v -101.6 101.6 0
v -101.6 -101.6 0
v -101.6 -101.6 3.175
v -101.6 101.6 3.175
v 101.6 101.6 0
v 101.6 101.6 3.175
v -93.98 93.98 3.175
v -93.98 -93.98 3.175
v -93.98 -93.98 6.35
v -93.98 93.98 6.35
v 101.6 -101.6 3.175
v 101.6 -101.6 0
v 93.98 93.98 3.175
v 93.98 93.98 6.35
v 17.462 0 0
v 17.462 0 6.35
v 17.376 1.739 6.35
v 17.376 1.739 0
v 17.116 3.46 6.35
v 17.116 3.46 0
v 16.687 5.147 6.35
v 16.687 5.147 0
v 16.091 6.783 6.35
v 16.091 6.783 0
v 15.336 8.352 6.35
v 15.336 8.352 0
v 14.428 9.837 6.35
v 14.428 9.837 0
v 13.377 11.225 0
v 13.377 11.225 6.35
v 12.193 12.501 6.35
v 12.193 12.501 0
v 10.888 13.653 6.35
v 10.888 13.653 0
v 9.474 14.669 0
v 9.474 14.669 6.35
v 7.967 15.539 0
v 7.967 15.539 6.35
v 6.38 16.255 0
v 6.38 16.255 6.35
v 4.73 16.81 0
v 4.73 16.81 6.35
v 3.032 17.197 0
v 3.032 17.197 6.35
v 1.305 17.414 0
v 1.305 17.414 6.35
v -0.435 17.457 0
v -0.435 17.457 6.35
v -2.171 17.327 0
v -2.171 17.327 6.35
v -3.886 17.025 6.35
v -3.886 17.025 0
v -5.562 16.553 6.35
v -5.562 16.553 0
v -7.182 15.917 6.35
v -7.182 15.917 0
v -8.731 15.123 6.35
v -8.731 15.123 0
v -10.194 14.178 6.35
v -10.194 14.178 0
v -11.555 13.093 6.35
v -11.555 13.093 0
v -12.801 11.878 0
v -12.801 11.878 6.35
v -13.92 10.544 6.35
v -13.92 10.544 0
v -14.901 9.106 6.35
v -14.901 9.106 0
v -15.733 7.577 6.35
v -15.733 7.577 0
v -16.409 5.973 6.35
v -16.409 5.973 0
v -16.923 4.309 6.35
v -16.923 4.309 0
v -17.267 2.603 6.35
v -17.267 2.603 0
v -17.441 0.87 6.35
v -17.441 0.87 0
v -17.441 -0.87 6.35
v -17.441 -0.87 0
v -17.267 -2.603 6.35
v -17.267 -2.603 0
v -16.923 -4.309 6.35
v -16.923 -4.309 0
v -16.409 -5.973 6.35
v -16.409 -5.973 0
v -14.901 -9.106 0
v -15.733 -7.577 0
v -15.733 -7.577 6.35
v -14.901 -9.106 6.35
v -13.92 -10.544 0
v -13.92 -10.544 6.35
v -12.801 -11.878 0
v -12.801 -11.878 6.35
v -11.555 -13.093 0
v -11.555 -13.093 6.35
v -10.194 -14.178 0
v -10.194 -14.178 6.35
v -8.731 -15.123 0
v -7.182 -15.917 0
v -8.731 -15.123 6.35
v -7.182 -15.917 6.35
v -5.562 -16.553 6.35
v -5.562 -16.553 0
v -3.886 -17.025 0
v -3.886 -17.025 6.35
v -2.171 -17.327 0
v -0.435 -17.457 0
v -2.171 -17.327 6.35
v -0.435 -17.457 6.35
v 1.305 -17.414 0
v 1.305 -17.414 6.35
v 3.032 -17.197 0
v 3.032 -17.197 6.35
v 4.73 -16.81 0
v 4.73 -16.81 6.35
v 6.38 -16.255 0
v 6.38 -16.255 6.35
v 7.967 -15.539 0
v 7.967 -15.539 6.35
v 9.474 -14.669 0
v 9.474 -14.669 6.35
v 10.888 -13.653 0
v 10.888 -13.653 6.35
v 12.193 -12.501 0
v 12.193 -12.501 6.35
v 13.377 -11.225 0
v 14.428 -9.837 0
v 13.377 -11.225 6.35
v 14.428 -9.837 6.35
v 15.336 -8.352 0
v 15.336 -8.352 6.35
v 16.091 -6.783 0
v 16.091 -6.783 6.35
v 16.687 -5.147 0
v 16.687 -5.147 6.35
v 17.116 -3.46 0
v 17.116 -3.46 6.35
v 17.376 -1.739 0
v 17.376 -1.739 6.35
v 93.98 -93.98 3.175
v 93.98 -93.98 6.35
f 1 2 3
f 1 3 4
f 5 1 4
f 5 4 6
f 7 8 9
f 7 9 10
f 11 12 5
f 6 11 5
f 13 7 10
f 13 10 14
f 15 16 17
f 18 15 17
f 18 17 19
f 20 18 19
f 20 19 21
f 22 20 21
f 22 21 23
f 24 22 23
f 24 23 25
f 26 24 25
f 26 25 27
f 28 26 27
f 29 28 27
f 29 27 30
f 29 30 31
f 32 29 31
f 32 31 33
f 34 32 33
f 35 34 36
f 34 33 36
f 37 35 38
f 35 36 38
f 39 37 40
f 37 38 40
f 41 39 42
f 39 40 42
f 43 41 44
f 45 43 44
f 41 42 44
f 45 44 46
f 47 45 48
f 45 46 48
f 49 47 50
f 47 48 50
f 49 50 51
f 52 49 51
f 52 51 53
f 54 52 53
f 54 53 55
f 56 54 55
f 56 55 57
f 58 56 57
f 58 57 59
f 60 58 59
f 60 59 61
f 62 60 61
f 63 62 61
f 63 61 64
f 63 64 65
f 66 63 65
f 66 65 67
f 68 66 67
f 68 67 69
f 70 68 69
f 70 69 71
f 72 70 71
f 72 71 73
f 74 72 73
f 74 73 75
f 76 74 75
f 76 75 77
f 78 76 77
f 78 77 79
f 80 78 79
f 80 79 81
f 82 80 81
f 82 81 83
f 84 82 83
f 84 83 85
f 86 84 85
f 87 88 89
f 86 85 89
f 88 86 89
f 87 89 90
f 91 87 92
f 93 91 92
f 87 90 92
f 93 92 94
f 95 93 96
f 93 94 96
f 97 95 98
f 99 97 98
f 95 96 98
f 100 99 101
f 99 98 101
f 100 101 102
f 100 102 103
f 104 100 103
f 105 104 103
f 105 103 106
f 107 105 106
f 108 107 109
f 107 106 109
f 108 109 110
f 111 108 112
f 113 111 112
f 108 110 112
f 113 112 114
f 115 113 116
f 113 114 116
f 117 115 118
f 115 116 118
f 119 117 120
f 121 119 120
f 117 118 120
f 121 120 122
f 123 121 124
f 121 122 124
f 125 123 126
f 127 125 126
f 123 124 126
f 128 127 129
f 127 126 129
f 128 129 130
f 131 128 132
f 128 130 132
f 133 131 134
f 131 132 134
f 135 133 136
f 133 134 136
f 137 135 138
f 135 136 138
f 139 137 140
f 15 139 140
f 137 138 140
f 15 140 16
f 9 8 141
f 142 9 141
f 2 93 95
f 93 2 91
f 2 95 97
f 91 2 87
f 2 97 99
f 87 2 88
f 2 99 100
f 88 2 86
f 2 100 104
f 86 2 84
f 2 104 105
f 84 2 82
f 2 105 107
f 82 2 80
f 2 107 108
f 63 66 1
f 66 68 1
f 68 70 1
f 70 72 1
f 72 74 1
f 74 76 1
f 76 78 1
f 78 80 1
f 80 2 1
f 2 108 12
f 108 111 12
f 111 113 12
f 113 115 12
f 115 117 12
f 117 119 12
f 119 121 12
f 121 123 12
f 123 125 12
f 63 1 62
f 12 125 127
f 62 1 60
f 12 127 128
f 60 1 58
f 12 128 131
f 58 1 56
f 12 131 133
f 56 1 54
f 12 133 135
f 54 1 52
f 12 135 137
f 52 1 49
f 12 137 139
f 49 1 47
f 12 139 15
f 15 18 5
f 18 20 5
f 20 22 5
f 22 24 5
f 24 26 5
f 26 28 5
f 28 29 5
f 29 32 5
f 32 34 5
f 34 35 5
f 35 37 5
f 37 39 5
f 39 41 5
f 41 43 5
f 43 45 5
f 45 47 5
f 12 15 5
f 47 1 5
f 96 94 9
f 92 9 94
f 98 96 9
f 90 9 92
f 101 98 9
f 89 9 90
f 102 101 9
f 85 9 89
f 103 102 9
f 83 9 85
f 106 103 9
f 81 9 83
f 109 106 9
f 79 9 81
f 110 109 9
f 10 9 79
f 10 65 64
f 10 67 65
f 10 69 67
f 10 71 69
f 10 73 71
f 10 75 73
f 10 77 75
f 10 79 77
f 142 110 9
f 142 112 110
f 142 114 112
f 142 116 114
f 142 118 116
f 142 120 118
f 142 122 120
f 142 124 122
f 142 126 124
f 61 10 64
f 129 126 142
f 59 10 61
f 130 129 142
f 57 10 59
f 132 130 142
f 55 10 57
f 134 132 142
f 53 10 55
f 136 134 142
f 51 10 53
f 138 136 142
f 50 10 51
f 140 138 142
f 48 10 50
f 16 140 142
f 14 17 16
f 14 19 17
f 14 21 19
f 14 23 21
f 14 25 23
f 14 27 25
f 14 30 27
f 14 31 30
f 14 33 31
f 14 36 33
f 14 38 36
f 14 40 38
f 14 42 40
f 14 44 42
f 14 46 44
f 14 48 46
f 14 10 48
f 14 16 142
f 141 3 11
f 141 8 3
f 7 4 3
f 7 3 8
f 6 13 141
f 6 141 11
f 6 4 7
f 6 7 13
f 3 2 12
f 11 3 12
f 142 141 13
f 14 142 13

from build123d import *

# Parameters (mm, degrees)
F0_W     = 203.2
F0_H     = 203.2
F1_DEPTH = 3.175
F2_W     = 187.96
F2_H     = 187.96
F3_DEPTH = 3.175
F4_R     = 17.4625
F5_DEPTH = 25.4


with BuildPart() as f1:
    # F0 (on Top) → F1 (new body)
    with BuildSketch(Plane.XY):
        Rectangle(F0_W, F0_H)
    extrude(amount=F1_DEPTH)

    # F2 (on face) → F3 (join)
    with BuildSketch(Plane.XY.offset(3.175)):
        Rectangle(F2_W, F2_H)
    extrude(amount=F3_DEPTH)

    # F4 (on face) → F5 (cut)
    with BuildSketch(Plane.XY.offset(6.35)):
        Circle(F4_R)
    extrude(amount=-F5_DEPTH, mode=Mode.SUBTRACT)


solid = f1.part
